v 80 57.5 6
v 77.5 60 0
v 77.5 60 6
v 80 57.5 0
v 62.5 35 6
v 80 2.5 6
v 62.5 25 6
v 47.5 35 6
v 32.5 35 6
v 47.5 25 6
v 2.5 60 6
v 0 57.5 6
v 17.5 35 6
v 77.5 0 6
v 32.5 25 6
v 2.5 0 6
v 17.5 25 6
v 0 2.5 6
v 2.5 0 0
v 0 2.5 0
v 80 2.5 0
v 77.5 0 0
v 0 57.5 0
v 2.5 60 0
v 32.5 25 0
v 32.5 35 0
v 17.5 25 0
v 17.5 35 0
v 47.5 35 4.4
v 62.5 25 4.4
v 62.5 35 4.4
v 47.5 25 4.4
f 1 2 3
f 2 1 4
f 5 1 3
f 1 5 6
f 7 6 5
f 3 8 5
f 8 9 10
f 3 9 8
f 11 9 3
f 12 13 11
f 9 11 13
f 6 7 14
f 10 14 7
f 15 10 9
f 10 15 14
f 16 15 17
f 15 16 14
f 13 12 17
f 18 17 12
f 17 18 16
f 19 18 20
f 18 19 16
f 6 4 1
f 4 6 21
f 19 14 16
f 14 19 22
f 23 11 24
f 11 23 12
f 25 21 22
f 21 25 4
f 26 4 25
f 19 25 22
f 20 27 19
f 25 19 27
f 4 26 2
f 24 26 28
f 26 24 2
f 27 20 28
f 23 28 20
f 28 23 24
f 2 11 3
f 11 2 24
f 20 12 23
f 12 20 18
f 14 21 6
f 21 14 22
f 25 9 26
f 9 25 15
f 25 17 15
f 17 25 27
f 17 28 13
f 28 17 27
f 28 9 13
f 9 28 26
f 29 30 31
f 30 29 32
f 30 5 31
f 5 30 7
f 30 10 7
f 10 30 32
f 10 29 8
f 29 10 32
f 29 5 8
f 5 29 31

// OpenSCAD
$fn = 32;

// ----------------------------------------------------------------------
// Windowed plate: 2 voids, 80 x 60 x 6 mm
// ----------------------------------------------------------------------

// --- parameters (mm) ---
plate_l = 80;             // plate length, X
plate_w = 60;             // plate width, Y
plate_t = 6;              // plate thickness, Z
edge_margin = 10;         // wall from the plate edge to any window
windows = 2;              // number of windows in the row
win_l = 15;               // window length
win_w = 10;               // window width
win_pitch = 30;           // window pitch along X
depth_1 = 6;              // depth of void 1 (full thickness = through)
depth_2 = 1.6;            // depth of void 2 (full thickness = through)
corner_c = 2.5;           // corner chamfer of the plate

profile = [[2.5, 0], [77.5, 0], [80, 2.5], [80, 57.5], [77.5, 60], [2.5, 60], [0, 57.5], [0, 2.5]];  // primary outline, 8 points, counter clockwise
void_1 = [[17.5, 25], [32.5, 25], [32.5, 35], [17.5, 35]];  // window 1 of the row, 4 points
void_2 = [[47.5, 25], [62.5, 25], [62.5, 35], [47.5, 35]];  // window 2 of the row, 4 points

// --- the one profile operation ---
difference() {
  linear_extrude(height = plate_t) polygon(points = profile);
  translate([0, 0, -1])
    linear_extrude(height = plate_t + 2) polygon(points = void_1);
  translate([0, 0, plate_t - depth_2])
    linear_extrude(height = depth_2 + 1) polygon(points = void_2);
}
